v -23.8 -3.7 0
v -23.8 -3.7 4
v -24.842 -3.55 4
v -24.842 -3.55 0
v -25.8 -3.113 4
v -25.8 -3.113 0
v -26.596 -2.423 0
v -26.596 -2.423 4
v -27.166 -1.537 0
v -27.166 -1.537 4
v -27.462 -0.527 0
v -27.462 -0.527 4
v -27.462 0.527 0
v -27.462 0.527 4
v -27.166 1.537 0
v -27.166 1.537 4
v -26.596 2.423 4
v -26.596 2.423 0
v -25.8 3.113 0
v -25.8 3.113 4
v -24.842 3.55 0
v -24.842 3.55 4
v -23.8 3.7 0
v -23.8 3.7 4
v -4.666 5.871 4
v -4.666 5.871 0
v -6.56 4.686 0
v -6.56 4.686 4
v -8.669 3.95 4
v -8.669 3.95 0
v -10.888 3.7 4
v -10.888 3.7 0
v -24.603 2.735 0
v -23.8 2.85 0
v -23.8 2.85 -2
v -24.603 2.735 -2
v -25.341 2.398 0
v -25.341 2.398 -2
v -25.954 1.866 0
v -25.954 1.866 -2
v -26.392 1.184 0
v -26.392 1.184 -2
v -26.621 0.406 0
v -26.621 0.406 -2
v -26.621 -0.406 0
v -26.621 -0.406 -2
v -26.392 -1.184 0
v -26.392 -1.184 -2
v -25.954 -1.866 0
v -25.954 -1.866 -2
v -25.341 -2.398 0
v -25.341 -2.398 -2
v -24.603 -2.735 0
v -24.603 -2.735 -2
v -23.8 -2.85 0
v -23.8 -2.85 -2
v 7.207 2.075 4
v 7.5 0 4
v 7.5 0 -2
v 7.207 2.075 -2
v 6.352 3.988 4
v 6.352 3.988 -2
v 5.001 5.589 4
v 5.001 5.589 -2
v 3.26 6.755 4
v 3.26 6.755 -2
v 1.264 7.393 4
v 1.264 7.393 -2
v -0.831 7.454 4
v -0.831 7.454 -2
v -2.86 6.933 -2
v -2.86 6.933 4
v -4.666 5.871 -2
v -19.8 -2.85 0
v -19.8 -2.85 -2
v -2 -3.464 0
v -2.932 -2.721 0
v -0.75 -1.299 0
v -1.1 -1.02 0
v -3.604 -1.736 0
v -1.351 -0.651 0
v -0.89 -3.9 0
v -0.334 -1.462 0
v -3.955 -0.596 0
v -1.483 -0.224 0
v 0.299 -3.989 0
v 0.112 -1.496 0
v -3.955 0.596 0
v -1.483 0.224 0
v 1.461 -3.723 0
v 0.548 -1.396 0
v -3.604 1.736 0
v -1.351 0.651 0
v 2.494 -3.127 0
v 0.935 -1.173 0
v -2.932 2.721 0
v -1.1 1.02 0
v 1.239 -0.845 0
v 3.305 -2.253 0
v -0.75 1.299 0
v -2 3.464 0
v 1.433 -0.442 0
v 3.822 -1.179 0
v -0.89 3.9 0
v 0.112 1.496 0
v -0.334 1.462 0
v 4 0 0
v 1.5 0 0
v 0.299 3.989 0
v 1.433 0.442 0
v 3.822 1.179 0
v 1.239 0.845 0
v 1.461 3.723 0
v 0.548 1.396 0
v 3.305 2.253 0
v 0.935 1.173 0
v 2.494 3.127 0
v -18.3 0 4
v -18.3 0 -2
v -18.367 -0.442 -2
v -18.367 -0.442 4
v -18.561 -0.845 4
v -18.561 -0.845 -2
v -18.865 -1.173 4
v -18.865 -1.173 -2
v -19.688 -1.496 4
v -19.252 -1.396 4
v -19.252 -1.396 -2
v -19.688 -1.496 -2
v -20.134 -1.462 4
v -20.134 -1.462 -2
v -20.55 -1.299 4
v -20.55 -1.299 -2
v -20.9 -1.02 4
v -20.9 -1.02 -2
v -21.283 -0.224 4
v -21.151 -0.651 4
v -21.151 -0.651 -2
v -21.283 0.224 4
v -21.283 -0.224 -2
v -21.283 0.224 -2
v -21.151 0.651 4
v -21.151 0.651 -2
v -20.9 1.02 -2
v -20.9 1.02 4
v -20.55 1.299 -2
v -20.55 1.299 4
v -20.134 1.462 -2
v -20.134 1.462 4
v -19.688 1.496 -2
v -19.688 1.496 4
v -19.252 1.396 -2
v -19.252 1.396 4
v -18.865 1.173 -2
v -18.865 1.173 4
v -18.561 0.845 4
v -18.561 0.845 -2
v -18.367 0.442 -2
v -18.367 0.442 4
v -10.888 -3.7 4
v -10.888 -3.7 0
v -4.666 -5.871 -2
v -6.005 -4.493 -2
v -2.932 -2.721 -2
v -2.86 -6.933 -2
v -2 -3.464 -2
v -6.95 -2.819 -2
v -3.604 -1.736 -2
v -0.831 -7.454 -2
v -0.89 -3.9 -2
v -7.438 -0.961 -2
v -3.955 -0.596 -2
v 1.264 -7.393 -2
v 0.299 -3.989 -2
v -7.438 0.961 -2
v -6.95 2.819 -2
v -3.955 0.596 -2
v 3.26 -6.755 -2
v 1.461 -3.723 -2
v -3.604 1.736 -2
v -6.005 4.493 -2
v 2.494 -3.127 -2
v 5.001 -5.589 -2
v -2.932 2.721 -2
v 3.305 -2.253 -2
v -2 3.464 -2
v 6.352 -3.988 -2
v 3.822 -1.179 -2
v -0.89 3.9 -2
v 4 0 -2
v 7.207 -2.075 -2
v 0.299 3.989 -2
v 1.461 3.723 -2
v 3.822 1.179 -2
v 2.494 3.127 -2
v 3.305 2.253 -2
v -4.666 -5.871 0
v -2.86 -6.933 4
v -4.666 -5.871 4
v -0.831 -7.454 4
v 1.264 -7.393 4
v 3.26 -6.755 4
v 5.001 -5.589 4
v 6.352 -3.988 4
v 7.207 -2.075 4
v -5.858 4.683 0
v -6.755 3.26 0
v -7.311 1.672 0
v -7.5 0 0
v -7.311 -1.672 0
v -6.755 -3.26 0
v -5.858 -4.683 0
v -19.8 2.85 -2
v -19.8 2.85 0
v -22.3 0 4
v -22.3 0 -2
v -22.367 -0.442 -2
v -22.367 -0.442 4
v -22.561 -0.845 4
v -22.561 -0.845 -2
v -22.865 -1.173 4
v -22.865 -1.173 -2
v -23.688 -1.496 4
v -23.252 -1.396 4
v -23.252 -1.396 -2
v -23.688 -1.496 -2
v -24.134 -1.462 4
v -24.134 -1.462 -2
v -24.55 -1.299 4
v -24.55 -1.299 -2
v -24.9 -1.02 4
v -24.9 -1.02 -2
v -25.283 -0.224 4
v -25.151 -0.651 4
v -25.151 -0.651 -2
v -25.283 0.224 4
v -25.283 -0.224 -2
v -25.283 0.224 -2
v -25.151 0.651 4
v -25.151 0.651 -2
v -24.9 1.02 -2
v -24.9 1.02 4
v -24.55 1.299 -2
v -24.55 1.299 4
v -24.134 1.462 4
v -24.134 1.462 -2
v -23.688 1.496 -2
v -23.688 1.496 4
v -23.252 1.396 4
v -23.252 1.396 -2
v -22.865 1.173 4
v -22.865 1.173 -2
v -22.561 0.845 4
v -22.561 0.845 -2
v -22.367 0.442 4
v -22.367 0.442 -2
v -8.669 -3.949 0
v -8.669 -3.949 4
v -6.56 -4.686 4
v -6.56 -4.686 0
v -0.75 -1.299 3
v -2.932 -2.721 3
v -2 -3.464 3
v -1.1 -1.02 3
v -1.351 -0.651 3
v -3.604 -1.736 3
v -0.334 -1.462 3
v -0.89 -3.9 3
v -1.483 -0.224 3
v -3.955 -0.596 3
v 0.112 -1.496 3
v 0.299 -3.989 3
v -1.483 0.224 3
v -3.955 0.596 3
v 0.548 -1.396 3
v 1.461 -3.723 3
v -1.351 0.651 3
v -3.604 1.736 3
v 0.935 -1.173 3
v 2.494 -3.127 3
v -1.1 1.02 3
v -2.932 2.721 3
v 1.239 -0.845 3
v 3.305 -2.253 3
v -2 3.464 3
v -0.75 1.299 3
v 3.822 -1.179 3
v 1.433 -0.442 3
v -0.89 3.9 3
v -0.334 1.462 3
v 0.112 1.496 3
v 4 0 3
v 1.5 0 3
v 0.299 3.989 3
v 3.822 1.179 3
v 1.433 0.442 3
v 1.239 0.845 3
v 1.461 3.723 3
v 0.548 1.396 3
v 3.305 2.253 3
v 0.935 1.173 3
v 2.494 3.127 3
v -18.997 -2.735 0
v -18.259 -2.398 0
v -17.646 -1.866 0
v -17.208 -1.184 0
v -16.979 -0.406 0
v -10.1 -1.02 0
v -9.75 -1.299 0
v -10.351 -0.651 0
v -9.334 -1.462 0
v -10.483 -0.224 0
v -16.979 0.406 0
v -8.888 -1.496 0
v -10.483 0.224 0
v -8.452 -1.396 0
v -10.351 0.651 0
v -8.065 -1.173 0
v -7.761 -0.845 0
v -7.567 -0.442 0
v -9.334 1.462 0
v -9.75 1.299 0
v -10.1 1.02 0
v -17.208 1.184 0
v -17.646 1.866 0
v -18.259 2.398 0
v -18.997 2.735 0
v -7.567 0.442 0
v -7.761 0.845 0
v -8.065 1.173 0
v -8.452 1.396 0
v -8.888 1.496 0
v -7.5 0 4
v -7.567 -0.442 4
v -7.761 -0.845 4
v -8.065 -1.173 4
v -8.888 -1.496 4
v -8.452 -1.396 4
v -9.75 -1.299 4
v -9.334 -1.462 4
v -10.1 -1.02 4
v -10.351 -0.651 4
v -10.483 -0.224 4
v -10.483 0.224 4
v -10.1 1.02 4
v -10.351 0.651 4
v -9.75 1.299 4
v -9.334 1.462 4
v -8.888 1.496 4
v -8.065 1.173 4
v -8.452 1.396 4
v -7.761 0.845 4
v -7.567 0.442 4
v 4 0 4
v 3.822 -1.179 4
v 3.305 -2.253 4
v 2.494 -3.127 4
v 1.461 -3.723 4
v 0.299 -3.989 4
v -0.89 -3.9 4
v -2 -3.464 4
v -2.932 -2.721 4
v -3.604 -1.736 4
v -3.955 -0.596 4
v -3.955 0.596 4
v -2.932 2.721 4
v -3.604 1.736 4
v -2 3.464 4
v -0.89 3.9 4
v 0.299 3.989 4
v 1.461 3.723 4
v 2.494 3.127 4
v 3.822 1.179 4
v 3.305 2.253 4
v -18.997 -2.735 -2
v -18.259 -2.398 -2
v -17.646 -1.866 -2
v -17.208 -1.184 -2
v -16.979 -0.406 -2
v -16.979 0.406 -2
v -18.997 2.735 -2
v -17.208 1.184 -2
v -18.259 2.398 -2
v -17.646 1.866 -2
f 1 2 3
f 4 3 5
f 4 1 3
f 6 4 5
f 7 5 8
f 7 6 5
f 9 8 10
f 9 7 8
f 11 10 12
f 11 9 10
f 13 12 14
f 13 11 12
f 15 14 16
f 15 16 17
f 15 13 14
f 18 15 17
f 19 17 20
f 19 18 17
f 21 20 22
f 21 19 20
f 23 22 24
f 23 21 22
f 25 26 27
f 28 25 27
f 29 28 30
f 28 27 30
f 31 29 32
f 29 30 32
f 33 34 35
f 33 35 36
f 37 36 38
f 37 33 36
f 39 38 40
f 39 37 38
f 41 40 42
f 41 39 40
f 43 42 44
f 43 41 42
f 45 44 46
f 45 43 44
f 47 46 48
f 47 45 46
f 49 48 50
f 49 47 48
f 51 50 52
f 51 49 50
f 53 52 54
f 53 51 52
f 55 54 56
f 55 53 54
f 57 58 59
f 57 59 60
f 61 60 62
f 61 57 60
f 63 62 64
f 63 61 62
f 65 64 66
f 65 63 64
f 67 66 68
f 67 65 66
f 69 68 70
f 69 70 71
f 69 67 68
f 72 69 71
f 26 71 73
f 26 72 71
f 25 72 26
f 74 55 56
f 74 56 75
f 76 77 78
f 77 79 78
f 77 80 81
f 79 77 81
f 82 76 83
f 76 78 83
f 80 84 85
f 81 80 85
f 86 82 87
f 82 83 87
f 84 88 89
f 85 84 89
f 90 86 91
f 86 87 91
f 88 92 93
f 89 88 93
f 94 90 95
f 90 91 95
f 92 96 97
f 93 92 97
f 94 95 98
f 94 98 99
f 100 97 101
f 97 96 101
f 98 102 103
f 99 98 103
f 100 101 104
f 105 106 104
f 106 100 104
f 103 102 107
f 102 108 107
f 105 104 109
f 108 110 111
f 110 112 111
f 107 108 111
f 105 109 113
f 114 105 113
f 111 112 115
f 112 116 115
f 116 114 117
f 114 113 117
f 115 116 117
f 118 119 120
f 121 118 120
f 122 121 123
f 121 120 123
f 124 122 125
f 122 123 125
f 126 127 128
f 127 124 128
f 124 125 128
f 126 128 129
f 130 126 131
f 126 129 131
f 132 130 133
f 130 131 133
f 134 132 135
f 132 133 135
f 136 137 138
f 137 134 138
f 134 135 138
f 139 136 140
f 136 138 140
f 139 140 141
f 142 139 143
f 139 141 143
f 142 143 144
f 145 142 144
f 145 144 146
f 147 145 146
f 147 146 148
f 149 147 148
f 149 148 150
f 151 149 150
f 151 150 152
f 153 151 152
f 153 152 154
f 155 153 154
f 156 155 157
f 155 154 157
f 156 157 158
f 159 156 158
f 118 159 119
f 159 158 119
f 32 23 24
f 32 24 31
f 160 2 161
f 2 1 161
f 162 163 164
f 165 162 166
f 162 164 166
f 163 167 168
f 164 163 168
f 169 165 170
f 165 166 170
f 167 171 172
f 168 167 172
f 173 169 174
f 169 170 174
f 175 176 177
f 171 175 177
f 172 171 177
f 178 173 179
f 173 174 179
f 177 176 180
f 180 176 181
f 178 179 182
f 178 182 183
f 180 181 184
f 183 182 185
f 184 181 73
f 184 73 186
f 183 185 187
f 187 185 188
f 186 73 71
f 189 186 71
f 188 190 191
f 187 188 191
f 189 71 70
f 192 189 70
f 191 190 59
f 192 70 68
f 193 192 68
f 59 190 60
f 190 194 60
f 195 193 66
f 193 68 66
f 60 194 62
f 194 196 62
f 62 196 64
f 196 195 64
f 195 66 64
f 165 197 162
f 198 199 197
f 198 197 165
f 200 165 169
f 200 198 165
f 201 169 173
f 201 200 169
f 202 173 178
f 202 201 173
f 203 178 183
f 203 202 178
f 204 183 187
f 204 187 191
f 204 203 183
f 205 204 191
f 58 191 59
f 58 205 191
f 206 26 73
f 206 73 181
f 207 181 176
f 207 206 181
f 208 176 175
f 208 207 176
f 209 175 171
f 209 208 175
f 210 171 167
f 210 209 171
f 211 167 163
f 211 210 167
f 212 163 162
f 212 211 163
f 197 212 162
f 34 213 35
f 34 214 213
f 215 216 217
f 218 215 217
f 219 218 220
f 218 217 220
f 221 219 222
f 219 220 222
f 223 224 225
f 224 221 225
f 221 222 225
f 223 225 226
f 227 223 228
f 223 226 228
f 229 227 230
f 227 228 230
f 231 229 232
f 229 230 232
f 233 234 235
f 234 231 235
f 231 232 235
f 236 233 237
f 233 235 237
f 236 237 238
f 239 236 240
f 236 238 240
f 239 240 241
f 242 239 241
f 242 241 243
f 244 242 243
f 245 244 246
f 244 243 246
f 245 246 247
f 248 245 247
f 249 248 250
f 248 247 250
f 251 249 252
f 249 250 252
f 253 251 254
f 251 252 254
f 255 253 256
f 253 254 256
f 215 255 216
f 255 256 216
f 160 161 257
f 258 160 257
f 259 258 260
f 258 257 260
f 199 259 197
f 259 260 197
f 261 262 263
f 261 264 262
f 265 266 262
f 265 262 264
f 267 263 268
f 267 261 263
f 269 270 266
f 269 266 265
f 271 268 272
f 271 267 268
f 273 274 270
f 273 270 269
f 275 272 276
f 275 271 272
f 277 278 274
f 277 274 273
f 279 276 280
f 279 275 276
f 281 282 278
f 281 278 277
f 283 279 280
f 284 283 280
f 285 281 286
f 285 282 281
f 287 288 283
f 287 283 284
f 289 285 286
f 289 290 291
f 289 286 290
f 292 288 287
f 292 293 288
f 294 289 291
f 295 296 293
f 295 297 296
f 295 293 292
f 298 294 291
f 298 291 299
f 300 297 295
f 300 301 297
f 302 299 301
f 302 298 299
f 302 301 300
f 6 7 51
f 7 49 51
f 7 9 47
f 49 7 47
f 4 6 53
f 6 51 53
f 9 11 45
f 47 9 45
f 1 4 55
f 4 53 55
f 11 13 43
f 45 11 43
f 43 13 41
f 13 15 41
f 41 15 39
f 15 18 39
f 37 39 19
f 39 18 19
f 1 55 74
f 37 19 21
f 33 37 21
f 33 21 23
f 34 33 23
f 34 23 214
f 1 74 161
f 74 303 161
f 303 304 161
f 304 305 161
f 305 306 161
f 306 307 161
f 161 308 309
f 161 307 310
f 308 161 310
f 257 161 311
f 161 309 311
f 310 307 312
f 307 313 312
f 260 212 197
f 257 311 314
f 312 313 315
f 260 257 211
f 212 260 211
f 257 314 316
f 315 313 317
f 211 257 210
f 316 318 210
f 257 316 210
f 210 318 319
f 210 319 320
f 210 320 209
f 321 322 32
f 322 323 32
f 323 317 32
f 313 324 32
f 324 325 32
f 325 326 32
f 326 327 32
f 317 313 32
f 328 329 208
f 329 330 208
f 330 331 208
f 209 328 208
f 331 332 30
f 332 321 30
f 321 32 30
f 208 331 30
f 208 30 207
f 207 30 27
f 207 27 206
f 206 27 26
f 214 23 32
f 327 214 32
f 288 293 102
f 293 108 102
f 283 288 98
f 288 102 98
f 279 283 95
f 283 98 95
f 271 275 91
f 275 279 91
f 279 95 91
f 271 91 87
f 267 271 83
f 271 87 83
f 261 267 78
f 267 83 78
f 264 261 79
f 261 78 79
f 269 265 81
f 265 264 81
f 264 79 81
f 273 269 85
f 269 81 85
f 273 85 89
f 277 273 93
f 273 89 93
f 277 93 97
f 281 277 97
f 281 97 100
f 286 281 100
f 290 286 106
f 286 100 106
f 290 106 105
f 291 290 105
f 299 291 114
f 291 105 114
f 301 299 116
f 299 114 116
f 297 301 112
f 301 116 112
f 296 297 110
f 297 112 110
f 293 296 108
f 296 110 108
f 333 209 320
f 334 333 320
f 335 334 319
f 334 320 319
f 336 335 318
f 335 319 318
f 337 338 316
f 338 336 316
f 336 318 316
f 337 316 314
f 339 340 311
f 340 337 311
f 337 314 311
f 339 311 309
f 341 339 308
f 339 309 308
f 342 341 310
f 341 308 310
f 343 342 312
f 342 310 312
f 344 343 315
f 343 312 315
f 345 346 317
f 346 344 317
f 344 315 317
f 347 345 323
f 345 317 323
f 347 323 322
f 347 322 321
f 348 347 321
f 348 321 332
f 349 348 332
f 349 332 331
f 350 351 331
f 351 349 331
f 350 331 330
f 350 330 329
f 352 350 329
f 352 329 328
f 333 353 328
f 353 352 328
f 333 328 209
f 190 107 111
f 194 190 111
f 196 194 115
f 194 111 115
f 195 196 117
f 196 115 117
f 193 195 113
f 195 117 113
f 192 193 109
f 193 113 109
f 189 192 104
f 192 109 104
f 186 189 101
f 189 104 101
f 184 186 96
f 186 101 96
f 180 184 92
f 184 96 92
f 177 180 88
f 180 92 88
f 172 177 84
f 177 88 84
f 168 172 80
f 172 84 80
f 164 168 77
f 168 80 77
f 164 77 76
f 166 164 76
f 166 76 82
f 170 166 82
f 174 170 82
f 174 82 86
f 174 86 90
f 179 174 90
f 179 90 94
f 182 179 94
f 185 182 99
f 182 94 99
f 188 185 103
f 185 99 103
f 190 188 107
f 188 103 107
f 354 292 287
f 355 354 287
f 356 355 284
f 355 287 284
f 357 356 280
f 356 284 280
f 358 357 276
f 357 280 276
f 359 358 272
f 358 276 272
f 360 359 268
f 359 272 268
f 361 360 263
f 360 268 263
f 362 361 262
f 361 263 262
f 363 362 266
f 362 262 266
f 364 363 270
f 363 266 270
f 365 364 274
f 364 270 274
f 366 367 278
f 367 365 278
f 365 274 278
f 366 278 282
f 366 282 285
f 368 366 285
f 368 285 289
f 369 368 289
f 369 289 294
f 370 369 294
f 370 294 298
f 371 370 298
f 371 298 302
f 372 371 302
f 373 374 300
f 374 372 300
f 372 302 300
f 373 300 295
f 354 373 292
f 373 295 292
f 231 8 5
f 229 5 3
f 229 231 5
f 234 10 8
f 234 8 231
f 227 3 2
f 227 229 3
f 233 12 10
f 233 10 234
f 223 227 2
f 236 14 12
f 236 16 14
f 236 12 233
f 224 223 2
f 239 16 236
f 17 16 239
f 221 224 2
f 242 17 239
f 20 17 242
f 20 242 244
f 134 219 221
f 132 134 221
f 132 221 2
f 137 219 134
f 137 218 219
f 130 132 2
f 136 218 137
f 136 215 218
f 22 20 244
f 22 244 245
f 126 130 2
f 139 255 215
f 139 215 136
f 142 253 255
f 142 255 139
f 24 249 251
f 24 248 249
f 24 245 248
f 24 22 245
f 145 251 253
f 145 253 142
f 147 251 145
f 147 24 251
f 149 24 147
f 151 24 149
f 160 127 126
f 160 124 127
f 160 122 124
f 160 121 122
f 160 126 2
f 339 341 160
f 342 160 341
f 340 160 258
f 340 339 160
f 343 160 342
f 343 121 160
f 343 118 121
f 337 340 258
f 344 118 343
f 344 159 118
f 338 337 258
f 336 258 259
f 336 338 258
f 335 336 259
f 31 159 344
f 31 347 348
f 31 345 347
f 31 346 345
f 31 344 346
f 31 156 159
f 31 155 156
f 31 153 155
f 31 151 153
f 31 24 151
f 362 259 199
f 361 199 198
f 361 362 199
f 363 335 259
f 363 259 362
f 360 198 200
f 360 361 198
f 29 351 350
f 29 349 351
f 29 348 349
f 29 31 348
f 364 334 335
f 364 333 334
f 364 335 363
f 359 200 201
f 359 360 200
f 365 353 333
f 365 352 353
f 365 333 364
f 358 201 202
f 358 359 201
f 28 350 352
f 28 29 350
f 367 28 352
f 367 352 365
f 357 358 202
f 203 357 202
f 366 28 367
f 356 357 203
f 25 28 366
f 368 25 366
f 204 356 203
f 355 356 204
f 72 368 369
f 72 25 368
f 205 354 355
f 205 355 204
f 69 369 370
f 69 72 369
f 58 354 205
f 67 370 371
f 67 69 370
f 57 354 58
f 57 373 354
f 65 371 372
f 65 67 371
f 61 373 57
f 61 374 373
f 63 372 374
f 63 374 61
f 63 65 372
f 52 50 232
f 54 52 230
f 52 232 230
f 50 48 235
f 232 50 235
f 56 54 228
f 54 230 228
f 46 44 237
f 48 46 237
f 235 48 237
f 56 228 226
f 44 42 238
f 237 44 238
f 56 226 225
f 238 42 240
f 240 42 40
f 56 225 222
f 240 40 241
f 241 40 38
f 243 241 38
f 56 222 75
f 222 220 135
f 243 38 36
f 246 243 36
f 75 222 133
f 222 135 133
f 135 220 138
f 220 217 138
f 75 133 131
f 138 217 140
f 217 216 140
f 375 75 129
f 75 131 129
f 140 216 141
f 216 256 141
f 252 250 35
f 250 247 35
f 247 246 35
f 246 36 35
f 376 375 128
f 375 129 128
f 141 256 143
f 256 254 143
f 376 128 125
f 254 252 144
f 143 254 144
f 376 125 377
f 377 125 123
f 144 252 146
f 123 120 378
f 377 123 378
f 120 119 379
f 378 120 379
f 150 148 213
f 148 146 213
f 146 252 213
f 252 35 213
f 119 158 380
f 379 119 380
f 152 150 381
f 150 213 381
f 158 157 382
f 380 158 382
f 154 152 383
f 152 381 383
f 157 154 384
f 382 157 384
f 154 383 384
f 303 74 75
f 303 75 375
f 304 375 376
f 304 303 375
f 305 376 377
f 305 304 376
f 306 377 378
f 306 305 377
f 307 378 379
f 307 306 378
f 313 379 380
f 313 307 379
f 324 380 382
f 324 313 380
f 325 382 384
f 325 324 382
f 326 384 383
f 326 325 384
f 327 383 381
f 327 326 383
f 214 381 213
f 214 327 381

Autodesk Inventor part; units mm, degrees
ref_plane "YZ Plane" through (0, 0, 0) normal (1, 0, 0) x (0, 1, 0)
ref_plane "XZ Plane" through (0, 0, 0) normal (0, 1, 0) x (-1, 0, 0)
ref_plane "XY Plane" through (0, 0, 0) normal (0, 0, 1) x (1, 0, 0)
sketch "Sketch2" plane through (0, 0, 0) normal (0, 0, 1) x (1, 0, 0)
  circle A0 centre (0, 0) radius 1.5
  circle A1 centre (0, 0) radius 4
  arc A2 (-6.5238, 3.7) -> (-6.5238, -3.7) centre (0, 0) ccw construction
  line L0 (7.5, 0) -> (-27.5, 0) construction
  arc A3 (-23.8, -3.7) -> (-23.8, 3.7) centre (-23.8, 0) ccw construction
  circle A4 centre (-23.8, 0) radius 1.5
  circle A5 centre (-19.8, 0) radius 1.5
  line L1 (-23.8, 3.7) -> (-10.8885, 3.7)
  line L2 (-23.8, -3.7) -> (-10.8885, -3.7)
  arc A6 (-27.5, 0) -> (-23.8, -3.7) centre (-23.8, 0) ccw
  arc A7 (-23.8, 3.7) -> (-27.5, 0) centre (-23.8, 0) ccw
  arc A8 (7.5, 0) -> (-4.6665, 5.8714) centre (0, 0) ccw
  arc A9 (-6.5238, -3.7) -> (-4.6665, -5.8714) centre (0, 0) ccw construction
  circle A10 centre (-9, 0) radius 1.5
  arc A11 (-10.8885, 3.7) -> (-4.6665, 5.8714) centre (-10.8885, 13.7) ccw
  arc A12 (-4.6665, -5.8714) -> (-10.8885, -3.7) centre (-10.8885, -13.7) ccw
  arc A13 (-4.6665, -5.8714) -> (7.5, 0) centre (0, 0) ccw
  line L3 (-10.8885, -13.7) -> (-10.8885, 13.7) construction
  line L4 (-23.8, 0) -> (-19.8, 0) construction
  line L5 (-23.8, -2.85) -> (-19.8, -2.85)
  line L6 (-19.8, 2.85) -> (-23.8, 2.85)
  arc A14 (-23.8, 2.85) -> (-23.8, -2.85) centre (-23.8, 0) ccw
  arc A15 (-19.8, -2.85) -> (-19.8, 2.85) centre (-19.8, 0) ccw
  arc A16 (-4.6665, 5.8714) -> (-4.6665, -5.8714) centre (0, 0) ccw
  point P0 (-21.8, 0)
  dimension "d12" = 35
  dimension "d13" = 15
  dimension "d14" = 7.4
  dimension "d15" = 3
  dimension "d16" = 8
  dimension "d17" = 3
  dimension "d18" = 4
  dimension "d19" = 9
  dimension "d20" = 10
  dimension "d21" = 2.85
extrude "Extrusion3" add sketch "Sketch2" along normal blind 4 contours L1 A11 A16 A12 L2 A6 A7 | A8 A13 A16 | A14 L6 A15 L5
extrude "Extrusion4" add sketch "Sketch2" along normal blind 3 contours A1
extrude "Extrusion5" add sketch "Sketch2" against normal blind 2 contours A8 A13 A16 | A14 L6 A15 L5
properties part number "servo-metal-arm"
